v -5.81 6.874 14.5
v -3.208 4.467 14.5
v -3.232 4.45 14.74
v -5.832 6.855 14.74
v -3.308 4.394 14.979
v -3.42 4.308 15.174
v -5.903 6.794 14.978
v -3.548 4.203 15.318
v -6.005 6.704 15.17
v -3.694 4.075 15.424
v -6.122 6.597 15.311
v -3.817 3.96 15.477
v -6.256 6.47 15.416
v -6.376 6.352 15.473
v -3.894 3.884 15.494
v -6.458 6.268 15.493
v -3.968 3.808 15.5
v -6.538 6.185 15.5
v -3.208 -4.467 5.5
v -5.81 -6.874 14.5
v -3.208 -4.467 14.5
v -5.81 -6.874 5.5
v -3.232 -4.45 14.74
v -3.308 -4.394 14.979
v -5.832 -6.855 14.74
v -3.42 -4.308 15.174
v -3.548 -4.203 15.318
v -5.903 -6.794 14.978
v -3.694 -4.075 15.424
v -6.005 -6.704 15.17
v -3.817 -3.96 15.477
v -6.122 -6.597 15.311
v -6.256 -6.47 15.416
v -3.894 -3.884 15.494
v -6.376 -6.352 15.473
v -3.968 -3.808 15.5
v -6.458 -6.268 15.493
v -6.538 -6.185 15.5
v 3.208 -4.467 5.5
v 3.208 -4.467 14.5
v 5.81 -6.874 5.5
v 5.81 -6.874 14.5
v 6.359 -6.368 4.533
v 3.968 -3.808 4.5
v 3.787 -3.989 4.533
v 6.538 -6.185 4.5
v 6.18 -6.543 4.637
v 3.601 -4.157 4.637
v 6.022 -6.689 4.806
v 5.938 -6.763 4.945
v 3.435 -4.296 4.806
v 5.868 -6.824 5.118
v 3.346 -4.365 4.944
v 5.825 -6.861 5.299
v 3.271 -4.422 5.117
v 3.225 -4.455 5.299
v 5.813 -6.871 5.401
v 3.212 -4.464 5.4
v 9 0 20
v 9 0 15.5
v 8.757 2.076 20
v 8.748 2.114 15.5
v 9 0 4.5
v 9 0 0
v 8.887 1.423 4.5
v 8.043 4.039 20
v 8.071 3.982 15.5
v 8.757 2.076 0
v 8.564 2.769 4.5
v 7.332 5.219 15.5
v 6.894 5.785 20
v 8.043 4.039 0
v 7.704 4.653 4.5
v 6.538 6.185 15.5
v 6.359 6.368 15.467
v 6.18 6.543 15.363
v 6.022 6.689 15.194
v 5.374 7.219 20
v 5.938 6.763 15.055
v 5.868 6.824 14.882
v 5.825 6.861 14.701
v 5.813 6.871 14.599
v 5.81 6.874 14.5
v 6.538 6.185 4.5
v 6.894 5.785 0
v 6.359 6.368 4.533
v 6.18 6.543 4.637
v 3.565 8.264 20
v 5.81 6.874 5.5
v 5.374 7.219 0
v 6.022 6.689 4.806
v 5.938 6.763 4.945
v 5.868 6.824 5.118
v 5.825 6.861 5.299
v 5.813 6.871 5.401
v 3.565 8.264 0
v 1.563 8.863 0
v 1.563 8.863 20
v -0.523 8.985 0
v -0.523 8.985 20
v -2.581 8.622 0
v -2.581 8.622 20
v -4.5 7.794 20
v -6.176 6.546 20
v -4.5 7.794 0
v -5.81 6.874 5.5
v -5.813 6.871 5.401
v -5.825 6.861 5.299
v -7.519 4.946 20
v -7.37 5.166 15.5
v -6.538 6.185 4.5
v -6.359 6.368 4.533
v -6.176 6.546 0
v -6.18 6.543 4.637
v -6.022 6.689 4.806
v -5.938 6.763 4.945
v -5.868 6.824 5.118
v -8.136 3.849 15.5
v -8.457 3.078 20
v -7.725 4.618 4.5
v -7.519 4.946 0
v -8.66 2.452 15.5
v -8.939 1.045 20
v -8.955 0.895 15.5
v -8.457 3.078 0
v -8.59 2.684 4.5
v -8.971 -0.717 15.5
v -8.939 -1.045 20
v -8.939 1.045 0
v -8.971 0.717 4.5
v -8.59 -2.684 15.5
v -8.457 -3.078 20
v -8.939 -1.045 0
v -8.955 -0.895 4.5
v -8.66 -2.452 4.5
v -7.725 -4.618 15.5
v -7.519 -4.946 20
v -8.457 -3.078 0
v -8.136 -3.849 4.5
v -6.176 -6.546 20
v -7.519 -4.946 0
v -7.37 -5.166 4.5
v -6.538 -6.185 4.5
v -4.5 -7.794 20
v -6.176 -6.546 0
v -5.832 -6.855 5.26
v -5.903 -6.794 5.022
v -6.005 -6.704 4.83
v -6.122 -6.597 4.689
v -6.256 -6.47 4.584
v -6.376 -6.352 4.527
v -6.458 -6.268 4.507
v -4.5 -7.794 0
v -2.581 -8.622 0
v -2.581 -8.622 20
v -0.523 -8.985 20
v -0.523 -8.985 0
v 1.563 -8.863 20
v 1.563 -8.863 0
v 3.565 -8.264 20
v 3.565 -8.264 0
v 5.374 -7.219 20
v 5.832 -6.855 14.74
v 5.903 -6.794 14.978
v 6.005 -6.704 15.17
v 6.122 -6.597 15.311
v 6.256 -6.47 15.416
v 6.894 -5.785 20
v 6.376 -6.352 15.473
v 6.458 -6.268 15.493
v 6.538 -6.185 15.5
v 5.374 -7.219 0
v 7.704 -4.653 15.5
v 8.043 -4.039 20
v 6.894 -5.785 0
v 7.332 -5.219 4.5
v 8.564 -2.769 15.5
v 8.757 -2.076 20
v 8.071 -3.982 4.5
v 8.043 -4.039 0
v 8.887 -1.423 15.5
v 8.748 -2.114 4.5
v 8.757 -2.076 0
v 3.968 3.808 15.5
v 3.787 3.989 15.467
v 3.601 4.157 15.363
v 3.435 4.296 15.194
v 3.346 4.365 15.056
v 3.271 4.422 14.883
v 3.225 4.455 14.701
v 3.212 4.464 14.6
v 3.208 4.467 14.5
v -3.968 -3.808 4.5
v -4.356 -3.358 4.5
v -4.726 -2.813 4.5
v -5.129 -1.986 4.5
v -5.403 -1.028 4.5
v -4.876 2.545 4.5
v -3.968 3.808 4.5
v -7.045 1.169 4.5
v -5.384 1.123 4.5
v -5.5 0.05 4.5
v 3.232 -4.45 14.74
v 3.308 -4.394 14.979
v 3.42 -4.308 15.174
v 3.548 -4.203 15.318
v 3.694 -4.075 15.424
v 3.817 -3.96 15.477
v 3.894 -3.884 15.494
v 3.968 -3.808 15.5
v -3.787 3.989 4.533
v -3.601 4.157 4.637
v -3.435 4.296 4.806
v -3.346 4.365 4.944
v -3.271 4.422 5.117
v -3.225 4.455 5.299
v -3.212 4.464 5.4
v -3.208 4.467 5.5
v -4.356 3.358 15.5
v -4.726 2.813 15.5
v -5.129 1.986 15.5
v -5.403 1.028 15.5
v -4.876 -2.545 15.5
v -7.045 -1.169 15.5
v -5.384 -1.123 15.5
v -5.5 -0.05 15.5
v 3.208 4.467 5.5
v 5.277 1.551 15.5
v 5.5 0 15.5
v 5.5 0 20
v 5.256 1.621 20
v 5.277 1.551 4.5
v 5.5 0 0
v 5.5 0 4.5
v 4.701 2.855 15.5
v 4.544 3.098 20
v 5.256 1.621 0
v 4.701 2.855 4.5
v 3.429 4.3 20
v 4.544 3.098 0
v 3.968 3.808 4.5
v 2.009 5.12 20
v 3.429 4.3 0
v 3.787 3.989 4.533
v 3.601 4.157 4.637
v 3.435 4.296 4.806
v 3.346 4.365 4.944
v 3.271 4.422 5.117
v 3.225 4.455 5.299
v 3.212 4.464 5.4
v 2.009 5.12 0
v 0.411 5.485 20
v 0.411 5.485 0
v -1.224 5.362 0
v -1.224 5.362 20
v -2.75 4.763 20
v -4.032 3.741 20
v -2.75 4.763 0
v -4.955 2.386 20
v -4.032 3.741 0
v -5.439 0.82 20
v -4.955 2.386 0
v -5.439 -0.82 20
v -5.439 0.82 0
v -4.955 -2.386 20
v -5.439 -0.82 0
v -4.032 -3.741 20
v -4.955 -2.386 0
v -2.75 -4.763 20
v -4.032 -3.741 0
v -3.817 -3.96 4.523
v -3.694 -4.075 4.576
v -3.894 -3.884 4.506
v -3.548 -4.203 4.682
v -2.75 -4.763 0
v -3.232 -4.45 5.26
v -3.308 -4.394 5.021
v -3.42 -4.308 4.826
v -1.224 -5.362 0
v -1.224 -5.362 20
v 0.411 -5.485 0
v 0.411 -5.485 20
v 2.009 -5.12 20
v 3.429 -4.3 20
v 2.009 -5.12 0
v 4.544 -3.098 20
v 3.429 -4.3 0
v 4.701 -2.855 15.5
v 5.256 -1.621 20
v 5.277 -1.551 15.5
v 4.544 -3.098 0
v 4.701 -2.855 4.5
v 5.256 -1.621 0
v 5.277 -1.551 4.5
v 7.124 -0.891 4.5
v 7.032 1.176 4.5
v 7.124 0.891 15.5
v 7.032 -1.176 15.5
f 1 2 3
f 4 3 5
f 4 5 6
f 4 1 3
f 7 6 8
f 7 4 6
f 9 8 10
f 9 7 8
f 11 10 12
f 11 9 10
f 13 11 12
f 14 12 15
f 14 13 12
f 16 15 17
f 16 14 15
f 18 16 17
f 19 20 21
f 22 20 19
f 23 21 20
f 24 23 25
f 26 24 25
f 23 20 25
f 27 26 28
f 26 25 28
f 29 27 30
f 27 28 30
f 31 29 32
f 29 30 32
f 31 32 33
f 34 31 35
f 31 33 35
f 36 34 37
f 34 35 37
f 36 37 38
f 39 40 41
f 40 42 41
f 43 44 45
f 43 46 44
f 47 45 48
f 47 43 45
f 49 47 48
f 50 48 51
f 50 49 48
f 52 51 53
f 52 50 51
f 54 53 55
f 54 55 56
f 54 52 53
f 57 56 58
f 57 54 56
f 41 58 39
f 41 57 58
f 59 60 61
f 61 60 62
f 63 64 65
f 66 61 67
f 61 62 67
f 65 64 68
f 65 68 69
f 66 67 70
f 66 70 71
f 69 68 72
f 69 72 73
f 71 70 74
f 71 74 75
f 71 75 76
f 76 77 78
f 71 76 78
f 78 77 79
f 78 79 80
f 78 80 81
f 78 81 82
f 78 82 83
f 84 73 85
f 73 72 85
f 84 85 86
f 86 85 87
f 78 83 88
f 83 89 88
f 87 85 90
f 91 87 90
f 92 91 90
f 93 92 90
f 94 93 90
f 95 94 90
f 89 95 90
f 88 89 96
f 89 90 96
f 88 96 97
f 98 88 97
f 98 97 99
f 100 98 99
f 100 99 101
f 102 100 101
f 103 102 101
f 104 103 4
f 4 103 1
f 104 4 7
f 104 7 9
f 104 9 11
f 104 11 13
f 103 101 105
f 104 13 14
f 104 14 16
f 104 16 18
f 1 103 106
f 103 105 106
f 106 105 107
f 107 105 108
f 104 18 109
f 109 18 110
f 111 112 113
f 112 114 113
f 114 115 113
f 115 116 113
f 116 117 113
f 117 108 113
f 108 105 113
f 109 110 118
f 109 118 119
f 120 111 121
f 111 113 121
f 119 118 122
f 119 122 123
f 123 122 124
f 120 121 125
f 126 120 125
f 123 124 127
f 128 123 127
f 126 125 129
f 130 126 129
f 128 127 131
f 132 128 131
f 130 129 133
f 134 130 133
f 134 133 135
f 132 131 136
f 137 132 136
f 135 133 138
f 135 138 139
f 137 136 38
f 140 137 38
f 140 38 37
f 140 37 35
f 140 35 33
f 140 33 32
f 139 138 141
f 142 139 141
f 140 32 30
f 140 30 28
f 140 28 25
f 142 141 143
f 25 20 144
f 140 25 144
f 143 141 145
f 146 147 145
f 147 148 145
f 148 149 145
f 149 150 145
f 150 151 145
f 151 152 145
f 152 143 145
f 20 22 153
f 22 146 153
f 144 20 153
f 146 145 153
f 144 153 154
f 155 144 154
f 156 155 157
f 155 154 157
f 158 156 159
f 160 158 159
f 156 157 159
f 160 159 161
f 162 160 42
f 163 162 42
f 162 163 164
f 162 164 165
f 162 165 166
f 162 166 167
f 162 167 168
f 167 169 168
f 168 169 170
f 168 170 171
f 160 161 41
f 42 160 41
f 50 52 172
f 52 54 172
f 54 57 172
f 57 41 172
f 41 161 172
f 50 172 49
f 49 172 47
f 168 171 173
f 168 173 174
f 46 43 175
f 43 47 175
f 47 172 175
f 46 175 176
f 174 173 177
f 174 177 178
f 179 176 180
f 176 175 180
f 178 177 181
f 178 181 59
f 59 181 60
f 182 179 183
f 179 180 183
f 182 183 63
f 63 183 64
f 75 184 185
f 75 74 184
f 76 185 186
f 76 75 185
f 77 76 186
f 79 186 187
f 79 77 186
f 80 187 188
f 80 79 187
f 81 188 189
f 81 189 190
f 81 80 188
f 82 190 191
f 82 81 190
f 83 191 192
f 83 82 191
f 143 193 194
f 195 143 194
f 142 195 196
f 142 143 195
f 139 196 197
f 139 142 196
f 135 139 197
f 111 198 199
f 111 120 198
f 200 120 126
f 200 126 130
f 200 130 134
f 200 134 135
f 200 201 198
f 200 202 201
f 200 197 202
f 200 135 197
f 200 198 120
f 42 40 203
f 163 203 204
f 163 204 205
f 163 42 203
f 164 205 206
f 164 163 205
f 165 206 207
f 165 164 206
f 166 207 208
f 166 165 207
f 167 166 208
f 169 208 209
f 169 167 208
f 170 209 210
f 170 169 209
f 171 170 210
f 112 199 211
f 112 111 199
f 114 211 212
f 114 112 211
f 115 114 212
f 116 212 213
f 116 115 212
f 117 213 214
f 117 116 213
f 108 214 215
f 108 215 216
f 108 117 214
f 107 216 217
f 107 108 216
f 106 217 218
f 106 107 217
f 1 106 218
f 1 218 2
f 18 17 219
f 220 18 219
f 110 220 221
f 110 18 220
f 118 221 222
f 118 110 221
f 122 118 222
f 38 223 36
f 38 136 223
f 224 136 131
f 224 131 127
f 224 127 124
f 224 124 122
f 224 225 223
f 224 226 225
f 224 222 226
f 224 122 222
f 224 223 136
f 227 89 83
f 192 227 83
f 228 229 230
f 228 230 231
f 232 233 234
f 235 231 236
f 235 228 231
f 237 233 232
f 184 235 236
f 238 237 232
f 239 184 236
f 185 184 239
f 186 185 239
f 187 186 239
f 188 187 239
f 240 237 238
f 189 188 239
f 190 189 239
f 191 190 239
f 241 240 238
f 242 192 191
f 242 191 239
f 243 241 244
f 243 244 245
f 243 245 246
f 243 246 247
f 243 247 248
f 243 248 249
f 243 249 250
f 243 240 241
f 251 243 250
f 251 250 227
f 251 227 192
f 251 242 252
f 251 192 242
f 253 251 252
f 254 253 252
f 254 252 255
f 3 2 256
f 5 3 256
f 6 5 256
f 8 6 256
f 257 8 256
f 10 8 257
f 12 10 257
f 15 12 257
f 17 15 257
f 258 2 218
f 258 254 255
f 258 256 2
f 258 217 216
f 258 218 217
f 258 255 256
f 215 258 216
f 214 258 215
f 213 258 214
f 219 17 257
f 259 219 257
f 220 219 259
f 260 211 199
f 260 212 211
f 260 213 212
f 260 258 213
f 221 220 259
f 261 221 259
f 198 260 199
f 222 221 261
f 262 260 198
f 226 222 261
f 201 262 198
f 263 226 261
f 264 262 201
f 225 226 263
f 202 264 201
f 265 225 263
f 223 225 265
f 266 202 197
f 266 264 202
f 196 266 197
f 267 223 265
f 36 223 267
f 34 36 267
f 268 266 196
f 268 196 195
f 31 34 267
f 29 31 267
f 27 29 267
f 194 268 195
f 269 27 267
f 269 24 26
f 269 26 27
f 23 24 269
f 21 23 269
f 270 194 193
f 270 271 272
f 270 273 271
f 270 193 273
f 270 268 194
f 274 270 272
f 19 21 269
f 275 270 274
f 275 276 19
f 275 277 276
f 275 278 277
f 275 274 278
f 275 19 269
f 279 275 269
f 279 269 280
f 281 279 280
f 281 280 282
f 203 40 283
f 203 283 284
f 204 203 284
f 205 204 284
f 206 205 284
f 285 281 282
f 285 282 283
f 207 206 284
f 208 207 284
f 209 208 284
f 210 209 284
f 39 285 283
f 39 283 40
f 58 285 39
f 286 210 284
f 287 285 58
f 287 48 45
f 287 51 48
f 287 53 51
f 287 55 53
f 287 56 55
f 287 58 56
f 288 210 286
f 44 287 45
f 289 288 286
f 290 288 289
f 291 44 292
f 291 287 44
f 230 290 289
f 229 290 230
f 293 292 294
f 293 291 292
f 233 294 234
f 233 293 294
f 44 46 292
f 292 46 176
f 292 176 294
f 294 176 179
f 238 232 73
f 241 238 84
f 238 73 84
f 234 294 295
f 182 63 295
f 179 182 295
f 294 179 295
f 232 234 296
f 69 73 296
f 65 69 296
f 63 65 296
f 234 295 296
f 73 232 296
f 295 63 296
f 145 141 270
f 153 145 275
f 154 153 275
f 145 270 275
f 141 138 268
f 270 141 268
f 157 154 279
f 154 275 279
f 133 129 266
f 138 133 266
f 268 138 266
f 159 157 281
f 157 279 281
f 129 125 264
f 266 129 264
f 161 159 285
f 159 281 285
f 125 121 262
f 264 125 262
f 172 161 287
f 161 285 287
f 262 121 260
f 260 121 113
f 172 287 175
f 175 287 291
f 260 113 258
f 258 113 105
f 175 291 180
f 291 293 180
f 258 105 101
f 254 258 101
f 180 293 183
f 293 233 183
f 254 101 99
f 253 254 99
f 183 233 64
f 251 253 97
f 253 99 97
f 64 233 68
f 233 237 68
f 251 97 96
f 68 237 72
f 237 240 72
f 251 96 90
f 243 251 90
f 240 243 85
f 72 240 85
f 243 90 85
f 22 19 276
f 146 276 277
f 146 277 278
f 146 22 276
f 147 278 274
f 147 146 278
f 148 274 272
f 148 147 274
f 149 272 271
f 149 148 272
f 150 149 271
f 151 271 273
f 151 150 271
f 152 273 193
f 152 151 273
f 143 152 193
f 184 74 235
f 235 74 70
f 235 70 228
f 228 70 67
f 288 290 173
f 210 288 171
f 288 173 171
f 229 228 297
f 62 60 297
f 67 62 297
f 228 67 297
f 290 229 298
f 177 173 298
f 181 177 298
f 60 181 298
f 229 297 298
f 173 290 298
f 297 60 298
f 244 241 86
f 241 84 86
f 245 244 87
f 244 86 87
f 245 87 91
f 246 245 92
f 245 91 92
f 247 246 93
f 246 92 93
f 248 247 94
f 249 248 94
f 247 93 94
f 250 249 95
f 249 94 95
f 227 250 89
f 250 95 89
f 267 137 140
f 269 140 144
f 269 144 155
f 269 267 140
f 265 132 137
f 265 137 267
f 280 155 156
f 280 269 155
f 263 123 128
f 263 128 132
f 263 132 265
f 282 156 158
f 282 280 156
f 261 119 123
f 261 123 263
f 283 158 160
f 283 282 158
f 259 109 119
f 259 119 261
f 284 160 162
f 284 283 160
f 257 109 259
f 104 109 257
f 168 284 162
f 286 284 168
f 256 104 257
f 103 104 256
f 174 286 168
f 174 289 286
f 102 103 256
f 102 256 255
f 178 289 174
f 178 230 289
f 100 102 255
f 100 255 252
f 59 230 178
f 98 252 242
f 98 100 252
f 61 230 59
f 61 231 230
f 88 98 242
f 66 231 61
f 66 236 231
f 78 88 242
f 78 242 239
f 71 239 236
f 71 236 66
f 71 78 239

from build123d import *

# Parameters (mm, degrees)
F0_R     = 9
F0_R_2   = 5.5
F1_DEPTH = 20
F2_W     = 3
F2_H     = 11
F4_W     = 40
F4_H     = 11
F6_W     = 40
F6_H     = 11
F9_R     = 1


with BuildPart() as f1:
    # F0 (on Top) → F1 (new body)
    with BuildSketch(Plane.XY):
        Circle(F0_R)
        Circle(F0_R_2, mode=Mode.SUBTRACT)
    extrude(amount=F1_DEPTH)

    # F2 (on Right) → F7 section 0
    with BuildSketch(Plane.YZ):
        with Locations((0, 10)):
            Rectangle(F2_W, F2_H)
    # F4 (on offset) → F7 section 1
    with BuildSketch(Plane.YZ.offset(20)):
        with Locations((0, 10)):
            Rectangle(F4_W, F4_H)
    loft(mode=Mode.SUBTRACT)

    # F2 (on Right) → F8 section 0
    with BuildSketch(Plane.YZ):
        with Locations((0, 10)):
            Rectangle(F2_W, F2_H)
    # F6 (on offset) → F8 section 1
    with BuildSketch(Plane.YZ.offset(-20)):
        with Locations((0, 10)):
            Rectangle(F6_W, F6_H)
    loft(mode=Mode.SUBTRACT)

    # F9
    f9_edges = [f1.edges().sort_by_distance(p)[0] for p in [
        (4.508802, -5.670642, 15.5),
        (4.508802, 5.670642, 15.5),
        (4.508802, 5.670642, 4.5),
        (4.508802, -5.670642, 4.5),
        (-4.508802, 5.670642, 4.5),
        (-4.508802, -5.670642, 4.5),
        (-4.508802, -5.670642, 15.5),
        (-4.508802, 5.670642, 15.5),
    ]]
    fillet(f9_edges, radius=F9_R)


solid = f1.part
